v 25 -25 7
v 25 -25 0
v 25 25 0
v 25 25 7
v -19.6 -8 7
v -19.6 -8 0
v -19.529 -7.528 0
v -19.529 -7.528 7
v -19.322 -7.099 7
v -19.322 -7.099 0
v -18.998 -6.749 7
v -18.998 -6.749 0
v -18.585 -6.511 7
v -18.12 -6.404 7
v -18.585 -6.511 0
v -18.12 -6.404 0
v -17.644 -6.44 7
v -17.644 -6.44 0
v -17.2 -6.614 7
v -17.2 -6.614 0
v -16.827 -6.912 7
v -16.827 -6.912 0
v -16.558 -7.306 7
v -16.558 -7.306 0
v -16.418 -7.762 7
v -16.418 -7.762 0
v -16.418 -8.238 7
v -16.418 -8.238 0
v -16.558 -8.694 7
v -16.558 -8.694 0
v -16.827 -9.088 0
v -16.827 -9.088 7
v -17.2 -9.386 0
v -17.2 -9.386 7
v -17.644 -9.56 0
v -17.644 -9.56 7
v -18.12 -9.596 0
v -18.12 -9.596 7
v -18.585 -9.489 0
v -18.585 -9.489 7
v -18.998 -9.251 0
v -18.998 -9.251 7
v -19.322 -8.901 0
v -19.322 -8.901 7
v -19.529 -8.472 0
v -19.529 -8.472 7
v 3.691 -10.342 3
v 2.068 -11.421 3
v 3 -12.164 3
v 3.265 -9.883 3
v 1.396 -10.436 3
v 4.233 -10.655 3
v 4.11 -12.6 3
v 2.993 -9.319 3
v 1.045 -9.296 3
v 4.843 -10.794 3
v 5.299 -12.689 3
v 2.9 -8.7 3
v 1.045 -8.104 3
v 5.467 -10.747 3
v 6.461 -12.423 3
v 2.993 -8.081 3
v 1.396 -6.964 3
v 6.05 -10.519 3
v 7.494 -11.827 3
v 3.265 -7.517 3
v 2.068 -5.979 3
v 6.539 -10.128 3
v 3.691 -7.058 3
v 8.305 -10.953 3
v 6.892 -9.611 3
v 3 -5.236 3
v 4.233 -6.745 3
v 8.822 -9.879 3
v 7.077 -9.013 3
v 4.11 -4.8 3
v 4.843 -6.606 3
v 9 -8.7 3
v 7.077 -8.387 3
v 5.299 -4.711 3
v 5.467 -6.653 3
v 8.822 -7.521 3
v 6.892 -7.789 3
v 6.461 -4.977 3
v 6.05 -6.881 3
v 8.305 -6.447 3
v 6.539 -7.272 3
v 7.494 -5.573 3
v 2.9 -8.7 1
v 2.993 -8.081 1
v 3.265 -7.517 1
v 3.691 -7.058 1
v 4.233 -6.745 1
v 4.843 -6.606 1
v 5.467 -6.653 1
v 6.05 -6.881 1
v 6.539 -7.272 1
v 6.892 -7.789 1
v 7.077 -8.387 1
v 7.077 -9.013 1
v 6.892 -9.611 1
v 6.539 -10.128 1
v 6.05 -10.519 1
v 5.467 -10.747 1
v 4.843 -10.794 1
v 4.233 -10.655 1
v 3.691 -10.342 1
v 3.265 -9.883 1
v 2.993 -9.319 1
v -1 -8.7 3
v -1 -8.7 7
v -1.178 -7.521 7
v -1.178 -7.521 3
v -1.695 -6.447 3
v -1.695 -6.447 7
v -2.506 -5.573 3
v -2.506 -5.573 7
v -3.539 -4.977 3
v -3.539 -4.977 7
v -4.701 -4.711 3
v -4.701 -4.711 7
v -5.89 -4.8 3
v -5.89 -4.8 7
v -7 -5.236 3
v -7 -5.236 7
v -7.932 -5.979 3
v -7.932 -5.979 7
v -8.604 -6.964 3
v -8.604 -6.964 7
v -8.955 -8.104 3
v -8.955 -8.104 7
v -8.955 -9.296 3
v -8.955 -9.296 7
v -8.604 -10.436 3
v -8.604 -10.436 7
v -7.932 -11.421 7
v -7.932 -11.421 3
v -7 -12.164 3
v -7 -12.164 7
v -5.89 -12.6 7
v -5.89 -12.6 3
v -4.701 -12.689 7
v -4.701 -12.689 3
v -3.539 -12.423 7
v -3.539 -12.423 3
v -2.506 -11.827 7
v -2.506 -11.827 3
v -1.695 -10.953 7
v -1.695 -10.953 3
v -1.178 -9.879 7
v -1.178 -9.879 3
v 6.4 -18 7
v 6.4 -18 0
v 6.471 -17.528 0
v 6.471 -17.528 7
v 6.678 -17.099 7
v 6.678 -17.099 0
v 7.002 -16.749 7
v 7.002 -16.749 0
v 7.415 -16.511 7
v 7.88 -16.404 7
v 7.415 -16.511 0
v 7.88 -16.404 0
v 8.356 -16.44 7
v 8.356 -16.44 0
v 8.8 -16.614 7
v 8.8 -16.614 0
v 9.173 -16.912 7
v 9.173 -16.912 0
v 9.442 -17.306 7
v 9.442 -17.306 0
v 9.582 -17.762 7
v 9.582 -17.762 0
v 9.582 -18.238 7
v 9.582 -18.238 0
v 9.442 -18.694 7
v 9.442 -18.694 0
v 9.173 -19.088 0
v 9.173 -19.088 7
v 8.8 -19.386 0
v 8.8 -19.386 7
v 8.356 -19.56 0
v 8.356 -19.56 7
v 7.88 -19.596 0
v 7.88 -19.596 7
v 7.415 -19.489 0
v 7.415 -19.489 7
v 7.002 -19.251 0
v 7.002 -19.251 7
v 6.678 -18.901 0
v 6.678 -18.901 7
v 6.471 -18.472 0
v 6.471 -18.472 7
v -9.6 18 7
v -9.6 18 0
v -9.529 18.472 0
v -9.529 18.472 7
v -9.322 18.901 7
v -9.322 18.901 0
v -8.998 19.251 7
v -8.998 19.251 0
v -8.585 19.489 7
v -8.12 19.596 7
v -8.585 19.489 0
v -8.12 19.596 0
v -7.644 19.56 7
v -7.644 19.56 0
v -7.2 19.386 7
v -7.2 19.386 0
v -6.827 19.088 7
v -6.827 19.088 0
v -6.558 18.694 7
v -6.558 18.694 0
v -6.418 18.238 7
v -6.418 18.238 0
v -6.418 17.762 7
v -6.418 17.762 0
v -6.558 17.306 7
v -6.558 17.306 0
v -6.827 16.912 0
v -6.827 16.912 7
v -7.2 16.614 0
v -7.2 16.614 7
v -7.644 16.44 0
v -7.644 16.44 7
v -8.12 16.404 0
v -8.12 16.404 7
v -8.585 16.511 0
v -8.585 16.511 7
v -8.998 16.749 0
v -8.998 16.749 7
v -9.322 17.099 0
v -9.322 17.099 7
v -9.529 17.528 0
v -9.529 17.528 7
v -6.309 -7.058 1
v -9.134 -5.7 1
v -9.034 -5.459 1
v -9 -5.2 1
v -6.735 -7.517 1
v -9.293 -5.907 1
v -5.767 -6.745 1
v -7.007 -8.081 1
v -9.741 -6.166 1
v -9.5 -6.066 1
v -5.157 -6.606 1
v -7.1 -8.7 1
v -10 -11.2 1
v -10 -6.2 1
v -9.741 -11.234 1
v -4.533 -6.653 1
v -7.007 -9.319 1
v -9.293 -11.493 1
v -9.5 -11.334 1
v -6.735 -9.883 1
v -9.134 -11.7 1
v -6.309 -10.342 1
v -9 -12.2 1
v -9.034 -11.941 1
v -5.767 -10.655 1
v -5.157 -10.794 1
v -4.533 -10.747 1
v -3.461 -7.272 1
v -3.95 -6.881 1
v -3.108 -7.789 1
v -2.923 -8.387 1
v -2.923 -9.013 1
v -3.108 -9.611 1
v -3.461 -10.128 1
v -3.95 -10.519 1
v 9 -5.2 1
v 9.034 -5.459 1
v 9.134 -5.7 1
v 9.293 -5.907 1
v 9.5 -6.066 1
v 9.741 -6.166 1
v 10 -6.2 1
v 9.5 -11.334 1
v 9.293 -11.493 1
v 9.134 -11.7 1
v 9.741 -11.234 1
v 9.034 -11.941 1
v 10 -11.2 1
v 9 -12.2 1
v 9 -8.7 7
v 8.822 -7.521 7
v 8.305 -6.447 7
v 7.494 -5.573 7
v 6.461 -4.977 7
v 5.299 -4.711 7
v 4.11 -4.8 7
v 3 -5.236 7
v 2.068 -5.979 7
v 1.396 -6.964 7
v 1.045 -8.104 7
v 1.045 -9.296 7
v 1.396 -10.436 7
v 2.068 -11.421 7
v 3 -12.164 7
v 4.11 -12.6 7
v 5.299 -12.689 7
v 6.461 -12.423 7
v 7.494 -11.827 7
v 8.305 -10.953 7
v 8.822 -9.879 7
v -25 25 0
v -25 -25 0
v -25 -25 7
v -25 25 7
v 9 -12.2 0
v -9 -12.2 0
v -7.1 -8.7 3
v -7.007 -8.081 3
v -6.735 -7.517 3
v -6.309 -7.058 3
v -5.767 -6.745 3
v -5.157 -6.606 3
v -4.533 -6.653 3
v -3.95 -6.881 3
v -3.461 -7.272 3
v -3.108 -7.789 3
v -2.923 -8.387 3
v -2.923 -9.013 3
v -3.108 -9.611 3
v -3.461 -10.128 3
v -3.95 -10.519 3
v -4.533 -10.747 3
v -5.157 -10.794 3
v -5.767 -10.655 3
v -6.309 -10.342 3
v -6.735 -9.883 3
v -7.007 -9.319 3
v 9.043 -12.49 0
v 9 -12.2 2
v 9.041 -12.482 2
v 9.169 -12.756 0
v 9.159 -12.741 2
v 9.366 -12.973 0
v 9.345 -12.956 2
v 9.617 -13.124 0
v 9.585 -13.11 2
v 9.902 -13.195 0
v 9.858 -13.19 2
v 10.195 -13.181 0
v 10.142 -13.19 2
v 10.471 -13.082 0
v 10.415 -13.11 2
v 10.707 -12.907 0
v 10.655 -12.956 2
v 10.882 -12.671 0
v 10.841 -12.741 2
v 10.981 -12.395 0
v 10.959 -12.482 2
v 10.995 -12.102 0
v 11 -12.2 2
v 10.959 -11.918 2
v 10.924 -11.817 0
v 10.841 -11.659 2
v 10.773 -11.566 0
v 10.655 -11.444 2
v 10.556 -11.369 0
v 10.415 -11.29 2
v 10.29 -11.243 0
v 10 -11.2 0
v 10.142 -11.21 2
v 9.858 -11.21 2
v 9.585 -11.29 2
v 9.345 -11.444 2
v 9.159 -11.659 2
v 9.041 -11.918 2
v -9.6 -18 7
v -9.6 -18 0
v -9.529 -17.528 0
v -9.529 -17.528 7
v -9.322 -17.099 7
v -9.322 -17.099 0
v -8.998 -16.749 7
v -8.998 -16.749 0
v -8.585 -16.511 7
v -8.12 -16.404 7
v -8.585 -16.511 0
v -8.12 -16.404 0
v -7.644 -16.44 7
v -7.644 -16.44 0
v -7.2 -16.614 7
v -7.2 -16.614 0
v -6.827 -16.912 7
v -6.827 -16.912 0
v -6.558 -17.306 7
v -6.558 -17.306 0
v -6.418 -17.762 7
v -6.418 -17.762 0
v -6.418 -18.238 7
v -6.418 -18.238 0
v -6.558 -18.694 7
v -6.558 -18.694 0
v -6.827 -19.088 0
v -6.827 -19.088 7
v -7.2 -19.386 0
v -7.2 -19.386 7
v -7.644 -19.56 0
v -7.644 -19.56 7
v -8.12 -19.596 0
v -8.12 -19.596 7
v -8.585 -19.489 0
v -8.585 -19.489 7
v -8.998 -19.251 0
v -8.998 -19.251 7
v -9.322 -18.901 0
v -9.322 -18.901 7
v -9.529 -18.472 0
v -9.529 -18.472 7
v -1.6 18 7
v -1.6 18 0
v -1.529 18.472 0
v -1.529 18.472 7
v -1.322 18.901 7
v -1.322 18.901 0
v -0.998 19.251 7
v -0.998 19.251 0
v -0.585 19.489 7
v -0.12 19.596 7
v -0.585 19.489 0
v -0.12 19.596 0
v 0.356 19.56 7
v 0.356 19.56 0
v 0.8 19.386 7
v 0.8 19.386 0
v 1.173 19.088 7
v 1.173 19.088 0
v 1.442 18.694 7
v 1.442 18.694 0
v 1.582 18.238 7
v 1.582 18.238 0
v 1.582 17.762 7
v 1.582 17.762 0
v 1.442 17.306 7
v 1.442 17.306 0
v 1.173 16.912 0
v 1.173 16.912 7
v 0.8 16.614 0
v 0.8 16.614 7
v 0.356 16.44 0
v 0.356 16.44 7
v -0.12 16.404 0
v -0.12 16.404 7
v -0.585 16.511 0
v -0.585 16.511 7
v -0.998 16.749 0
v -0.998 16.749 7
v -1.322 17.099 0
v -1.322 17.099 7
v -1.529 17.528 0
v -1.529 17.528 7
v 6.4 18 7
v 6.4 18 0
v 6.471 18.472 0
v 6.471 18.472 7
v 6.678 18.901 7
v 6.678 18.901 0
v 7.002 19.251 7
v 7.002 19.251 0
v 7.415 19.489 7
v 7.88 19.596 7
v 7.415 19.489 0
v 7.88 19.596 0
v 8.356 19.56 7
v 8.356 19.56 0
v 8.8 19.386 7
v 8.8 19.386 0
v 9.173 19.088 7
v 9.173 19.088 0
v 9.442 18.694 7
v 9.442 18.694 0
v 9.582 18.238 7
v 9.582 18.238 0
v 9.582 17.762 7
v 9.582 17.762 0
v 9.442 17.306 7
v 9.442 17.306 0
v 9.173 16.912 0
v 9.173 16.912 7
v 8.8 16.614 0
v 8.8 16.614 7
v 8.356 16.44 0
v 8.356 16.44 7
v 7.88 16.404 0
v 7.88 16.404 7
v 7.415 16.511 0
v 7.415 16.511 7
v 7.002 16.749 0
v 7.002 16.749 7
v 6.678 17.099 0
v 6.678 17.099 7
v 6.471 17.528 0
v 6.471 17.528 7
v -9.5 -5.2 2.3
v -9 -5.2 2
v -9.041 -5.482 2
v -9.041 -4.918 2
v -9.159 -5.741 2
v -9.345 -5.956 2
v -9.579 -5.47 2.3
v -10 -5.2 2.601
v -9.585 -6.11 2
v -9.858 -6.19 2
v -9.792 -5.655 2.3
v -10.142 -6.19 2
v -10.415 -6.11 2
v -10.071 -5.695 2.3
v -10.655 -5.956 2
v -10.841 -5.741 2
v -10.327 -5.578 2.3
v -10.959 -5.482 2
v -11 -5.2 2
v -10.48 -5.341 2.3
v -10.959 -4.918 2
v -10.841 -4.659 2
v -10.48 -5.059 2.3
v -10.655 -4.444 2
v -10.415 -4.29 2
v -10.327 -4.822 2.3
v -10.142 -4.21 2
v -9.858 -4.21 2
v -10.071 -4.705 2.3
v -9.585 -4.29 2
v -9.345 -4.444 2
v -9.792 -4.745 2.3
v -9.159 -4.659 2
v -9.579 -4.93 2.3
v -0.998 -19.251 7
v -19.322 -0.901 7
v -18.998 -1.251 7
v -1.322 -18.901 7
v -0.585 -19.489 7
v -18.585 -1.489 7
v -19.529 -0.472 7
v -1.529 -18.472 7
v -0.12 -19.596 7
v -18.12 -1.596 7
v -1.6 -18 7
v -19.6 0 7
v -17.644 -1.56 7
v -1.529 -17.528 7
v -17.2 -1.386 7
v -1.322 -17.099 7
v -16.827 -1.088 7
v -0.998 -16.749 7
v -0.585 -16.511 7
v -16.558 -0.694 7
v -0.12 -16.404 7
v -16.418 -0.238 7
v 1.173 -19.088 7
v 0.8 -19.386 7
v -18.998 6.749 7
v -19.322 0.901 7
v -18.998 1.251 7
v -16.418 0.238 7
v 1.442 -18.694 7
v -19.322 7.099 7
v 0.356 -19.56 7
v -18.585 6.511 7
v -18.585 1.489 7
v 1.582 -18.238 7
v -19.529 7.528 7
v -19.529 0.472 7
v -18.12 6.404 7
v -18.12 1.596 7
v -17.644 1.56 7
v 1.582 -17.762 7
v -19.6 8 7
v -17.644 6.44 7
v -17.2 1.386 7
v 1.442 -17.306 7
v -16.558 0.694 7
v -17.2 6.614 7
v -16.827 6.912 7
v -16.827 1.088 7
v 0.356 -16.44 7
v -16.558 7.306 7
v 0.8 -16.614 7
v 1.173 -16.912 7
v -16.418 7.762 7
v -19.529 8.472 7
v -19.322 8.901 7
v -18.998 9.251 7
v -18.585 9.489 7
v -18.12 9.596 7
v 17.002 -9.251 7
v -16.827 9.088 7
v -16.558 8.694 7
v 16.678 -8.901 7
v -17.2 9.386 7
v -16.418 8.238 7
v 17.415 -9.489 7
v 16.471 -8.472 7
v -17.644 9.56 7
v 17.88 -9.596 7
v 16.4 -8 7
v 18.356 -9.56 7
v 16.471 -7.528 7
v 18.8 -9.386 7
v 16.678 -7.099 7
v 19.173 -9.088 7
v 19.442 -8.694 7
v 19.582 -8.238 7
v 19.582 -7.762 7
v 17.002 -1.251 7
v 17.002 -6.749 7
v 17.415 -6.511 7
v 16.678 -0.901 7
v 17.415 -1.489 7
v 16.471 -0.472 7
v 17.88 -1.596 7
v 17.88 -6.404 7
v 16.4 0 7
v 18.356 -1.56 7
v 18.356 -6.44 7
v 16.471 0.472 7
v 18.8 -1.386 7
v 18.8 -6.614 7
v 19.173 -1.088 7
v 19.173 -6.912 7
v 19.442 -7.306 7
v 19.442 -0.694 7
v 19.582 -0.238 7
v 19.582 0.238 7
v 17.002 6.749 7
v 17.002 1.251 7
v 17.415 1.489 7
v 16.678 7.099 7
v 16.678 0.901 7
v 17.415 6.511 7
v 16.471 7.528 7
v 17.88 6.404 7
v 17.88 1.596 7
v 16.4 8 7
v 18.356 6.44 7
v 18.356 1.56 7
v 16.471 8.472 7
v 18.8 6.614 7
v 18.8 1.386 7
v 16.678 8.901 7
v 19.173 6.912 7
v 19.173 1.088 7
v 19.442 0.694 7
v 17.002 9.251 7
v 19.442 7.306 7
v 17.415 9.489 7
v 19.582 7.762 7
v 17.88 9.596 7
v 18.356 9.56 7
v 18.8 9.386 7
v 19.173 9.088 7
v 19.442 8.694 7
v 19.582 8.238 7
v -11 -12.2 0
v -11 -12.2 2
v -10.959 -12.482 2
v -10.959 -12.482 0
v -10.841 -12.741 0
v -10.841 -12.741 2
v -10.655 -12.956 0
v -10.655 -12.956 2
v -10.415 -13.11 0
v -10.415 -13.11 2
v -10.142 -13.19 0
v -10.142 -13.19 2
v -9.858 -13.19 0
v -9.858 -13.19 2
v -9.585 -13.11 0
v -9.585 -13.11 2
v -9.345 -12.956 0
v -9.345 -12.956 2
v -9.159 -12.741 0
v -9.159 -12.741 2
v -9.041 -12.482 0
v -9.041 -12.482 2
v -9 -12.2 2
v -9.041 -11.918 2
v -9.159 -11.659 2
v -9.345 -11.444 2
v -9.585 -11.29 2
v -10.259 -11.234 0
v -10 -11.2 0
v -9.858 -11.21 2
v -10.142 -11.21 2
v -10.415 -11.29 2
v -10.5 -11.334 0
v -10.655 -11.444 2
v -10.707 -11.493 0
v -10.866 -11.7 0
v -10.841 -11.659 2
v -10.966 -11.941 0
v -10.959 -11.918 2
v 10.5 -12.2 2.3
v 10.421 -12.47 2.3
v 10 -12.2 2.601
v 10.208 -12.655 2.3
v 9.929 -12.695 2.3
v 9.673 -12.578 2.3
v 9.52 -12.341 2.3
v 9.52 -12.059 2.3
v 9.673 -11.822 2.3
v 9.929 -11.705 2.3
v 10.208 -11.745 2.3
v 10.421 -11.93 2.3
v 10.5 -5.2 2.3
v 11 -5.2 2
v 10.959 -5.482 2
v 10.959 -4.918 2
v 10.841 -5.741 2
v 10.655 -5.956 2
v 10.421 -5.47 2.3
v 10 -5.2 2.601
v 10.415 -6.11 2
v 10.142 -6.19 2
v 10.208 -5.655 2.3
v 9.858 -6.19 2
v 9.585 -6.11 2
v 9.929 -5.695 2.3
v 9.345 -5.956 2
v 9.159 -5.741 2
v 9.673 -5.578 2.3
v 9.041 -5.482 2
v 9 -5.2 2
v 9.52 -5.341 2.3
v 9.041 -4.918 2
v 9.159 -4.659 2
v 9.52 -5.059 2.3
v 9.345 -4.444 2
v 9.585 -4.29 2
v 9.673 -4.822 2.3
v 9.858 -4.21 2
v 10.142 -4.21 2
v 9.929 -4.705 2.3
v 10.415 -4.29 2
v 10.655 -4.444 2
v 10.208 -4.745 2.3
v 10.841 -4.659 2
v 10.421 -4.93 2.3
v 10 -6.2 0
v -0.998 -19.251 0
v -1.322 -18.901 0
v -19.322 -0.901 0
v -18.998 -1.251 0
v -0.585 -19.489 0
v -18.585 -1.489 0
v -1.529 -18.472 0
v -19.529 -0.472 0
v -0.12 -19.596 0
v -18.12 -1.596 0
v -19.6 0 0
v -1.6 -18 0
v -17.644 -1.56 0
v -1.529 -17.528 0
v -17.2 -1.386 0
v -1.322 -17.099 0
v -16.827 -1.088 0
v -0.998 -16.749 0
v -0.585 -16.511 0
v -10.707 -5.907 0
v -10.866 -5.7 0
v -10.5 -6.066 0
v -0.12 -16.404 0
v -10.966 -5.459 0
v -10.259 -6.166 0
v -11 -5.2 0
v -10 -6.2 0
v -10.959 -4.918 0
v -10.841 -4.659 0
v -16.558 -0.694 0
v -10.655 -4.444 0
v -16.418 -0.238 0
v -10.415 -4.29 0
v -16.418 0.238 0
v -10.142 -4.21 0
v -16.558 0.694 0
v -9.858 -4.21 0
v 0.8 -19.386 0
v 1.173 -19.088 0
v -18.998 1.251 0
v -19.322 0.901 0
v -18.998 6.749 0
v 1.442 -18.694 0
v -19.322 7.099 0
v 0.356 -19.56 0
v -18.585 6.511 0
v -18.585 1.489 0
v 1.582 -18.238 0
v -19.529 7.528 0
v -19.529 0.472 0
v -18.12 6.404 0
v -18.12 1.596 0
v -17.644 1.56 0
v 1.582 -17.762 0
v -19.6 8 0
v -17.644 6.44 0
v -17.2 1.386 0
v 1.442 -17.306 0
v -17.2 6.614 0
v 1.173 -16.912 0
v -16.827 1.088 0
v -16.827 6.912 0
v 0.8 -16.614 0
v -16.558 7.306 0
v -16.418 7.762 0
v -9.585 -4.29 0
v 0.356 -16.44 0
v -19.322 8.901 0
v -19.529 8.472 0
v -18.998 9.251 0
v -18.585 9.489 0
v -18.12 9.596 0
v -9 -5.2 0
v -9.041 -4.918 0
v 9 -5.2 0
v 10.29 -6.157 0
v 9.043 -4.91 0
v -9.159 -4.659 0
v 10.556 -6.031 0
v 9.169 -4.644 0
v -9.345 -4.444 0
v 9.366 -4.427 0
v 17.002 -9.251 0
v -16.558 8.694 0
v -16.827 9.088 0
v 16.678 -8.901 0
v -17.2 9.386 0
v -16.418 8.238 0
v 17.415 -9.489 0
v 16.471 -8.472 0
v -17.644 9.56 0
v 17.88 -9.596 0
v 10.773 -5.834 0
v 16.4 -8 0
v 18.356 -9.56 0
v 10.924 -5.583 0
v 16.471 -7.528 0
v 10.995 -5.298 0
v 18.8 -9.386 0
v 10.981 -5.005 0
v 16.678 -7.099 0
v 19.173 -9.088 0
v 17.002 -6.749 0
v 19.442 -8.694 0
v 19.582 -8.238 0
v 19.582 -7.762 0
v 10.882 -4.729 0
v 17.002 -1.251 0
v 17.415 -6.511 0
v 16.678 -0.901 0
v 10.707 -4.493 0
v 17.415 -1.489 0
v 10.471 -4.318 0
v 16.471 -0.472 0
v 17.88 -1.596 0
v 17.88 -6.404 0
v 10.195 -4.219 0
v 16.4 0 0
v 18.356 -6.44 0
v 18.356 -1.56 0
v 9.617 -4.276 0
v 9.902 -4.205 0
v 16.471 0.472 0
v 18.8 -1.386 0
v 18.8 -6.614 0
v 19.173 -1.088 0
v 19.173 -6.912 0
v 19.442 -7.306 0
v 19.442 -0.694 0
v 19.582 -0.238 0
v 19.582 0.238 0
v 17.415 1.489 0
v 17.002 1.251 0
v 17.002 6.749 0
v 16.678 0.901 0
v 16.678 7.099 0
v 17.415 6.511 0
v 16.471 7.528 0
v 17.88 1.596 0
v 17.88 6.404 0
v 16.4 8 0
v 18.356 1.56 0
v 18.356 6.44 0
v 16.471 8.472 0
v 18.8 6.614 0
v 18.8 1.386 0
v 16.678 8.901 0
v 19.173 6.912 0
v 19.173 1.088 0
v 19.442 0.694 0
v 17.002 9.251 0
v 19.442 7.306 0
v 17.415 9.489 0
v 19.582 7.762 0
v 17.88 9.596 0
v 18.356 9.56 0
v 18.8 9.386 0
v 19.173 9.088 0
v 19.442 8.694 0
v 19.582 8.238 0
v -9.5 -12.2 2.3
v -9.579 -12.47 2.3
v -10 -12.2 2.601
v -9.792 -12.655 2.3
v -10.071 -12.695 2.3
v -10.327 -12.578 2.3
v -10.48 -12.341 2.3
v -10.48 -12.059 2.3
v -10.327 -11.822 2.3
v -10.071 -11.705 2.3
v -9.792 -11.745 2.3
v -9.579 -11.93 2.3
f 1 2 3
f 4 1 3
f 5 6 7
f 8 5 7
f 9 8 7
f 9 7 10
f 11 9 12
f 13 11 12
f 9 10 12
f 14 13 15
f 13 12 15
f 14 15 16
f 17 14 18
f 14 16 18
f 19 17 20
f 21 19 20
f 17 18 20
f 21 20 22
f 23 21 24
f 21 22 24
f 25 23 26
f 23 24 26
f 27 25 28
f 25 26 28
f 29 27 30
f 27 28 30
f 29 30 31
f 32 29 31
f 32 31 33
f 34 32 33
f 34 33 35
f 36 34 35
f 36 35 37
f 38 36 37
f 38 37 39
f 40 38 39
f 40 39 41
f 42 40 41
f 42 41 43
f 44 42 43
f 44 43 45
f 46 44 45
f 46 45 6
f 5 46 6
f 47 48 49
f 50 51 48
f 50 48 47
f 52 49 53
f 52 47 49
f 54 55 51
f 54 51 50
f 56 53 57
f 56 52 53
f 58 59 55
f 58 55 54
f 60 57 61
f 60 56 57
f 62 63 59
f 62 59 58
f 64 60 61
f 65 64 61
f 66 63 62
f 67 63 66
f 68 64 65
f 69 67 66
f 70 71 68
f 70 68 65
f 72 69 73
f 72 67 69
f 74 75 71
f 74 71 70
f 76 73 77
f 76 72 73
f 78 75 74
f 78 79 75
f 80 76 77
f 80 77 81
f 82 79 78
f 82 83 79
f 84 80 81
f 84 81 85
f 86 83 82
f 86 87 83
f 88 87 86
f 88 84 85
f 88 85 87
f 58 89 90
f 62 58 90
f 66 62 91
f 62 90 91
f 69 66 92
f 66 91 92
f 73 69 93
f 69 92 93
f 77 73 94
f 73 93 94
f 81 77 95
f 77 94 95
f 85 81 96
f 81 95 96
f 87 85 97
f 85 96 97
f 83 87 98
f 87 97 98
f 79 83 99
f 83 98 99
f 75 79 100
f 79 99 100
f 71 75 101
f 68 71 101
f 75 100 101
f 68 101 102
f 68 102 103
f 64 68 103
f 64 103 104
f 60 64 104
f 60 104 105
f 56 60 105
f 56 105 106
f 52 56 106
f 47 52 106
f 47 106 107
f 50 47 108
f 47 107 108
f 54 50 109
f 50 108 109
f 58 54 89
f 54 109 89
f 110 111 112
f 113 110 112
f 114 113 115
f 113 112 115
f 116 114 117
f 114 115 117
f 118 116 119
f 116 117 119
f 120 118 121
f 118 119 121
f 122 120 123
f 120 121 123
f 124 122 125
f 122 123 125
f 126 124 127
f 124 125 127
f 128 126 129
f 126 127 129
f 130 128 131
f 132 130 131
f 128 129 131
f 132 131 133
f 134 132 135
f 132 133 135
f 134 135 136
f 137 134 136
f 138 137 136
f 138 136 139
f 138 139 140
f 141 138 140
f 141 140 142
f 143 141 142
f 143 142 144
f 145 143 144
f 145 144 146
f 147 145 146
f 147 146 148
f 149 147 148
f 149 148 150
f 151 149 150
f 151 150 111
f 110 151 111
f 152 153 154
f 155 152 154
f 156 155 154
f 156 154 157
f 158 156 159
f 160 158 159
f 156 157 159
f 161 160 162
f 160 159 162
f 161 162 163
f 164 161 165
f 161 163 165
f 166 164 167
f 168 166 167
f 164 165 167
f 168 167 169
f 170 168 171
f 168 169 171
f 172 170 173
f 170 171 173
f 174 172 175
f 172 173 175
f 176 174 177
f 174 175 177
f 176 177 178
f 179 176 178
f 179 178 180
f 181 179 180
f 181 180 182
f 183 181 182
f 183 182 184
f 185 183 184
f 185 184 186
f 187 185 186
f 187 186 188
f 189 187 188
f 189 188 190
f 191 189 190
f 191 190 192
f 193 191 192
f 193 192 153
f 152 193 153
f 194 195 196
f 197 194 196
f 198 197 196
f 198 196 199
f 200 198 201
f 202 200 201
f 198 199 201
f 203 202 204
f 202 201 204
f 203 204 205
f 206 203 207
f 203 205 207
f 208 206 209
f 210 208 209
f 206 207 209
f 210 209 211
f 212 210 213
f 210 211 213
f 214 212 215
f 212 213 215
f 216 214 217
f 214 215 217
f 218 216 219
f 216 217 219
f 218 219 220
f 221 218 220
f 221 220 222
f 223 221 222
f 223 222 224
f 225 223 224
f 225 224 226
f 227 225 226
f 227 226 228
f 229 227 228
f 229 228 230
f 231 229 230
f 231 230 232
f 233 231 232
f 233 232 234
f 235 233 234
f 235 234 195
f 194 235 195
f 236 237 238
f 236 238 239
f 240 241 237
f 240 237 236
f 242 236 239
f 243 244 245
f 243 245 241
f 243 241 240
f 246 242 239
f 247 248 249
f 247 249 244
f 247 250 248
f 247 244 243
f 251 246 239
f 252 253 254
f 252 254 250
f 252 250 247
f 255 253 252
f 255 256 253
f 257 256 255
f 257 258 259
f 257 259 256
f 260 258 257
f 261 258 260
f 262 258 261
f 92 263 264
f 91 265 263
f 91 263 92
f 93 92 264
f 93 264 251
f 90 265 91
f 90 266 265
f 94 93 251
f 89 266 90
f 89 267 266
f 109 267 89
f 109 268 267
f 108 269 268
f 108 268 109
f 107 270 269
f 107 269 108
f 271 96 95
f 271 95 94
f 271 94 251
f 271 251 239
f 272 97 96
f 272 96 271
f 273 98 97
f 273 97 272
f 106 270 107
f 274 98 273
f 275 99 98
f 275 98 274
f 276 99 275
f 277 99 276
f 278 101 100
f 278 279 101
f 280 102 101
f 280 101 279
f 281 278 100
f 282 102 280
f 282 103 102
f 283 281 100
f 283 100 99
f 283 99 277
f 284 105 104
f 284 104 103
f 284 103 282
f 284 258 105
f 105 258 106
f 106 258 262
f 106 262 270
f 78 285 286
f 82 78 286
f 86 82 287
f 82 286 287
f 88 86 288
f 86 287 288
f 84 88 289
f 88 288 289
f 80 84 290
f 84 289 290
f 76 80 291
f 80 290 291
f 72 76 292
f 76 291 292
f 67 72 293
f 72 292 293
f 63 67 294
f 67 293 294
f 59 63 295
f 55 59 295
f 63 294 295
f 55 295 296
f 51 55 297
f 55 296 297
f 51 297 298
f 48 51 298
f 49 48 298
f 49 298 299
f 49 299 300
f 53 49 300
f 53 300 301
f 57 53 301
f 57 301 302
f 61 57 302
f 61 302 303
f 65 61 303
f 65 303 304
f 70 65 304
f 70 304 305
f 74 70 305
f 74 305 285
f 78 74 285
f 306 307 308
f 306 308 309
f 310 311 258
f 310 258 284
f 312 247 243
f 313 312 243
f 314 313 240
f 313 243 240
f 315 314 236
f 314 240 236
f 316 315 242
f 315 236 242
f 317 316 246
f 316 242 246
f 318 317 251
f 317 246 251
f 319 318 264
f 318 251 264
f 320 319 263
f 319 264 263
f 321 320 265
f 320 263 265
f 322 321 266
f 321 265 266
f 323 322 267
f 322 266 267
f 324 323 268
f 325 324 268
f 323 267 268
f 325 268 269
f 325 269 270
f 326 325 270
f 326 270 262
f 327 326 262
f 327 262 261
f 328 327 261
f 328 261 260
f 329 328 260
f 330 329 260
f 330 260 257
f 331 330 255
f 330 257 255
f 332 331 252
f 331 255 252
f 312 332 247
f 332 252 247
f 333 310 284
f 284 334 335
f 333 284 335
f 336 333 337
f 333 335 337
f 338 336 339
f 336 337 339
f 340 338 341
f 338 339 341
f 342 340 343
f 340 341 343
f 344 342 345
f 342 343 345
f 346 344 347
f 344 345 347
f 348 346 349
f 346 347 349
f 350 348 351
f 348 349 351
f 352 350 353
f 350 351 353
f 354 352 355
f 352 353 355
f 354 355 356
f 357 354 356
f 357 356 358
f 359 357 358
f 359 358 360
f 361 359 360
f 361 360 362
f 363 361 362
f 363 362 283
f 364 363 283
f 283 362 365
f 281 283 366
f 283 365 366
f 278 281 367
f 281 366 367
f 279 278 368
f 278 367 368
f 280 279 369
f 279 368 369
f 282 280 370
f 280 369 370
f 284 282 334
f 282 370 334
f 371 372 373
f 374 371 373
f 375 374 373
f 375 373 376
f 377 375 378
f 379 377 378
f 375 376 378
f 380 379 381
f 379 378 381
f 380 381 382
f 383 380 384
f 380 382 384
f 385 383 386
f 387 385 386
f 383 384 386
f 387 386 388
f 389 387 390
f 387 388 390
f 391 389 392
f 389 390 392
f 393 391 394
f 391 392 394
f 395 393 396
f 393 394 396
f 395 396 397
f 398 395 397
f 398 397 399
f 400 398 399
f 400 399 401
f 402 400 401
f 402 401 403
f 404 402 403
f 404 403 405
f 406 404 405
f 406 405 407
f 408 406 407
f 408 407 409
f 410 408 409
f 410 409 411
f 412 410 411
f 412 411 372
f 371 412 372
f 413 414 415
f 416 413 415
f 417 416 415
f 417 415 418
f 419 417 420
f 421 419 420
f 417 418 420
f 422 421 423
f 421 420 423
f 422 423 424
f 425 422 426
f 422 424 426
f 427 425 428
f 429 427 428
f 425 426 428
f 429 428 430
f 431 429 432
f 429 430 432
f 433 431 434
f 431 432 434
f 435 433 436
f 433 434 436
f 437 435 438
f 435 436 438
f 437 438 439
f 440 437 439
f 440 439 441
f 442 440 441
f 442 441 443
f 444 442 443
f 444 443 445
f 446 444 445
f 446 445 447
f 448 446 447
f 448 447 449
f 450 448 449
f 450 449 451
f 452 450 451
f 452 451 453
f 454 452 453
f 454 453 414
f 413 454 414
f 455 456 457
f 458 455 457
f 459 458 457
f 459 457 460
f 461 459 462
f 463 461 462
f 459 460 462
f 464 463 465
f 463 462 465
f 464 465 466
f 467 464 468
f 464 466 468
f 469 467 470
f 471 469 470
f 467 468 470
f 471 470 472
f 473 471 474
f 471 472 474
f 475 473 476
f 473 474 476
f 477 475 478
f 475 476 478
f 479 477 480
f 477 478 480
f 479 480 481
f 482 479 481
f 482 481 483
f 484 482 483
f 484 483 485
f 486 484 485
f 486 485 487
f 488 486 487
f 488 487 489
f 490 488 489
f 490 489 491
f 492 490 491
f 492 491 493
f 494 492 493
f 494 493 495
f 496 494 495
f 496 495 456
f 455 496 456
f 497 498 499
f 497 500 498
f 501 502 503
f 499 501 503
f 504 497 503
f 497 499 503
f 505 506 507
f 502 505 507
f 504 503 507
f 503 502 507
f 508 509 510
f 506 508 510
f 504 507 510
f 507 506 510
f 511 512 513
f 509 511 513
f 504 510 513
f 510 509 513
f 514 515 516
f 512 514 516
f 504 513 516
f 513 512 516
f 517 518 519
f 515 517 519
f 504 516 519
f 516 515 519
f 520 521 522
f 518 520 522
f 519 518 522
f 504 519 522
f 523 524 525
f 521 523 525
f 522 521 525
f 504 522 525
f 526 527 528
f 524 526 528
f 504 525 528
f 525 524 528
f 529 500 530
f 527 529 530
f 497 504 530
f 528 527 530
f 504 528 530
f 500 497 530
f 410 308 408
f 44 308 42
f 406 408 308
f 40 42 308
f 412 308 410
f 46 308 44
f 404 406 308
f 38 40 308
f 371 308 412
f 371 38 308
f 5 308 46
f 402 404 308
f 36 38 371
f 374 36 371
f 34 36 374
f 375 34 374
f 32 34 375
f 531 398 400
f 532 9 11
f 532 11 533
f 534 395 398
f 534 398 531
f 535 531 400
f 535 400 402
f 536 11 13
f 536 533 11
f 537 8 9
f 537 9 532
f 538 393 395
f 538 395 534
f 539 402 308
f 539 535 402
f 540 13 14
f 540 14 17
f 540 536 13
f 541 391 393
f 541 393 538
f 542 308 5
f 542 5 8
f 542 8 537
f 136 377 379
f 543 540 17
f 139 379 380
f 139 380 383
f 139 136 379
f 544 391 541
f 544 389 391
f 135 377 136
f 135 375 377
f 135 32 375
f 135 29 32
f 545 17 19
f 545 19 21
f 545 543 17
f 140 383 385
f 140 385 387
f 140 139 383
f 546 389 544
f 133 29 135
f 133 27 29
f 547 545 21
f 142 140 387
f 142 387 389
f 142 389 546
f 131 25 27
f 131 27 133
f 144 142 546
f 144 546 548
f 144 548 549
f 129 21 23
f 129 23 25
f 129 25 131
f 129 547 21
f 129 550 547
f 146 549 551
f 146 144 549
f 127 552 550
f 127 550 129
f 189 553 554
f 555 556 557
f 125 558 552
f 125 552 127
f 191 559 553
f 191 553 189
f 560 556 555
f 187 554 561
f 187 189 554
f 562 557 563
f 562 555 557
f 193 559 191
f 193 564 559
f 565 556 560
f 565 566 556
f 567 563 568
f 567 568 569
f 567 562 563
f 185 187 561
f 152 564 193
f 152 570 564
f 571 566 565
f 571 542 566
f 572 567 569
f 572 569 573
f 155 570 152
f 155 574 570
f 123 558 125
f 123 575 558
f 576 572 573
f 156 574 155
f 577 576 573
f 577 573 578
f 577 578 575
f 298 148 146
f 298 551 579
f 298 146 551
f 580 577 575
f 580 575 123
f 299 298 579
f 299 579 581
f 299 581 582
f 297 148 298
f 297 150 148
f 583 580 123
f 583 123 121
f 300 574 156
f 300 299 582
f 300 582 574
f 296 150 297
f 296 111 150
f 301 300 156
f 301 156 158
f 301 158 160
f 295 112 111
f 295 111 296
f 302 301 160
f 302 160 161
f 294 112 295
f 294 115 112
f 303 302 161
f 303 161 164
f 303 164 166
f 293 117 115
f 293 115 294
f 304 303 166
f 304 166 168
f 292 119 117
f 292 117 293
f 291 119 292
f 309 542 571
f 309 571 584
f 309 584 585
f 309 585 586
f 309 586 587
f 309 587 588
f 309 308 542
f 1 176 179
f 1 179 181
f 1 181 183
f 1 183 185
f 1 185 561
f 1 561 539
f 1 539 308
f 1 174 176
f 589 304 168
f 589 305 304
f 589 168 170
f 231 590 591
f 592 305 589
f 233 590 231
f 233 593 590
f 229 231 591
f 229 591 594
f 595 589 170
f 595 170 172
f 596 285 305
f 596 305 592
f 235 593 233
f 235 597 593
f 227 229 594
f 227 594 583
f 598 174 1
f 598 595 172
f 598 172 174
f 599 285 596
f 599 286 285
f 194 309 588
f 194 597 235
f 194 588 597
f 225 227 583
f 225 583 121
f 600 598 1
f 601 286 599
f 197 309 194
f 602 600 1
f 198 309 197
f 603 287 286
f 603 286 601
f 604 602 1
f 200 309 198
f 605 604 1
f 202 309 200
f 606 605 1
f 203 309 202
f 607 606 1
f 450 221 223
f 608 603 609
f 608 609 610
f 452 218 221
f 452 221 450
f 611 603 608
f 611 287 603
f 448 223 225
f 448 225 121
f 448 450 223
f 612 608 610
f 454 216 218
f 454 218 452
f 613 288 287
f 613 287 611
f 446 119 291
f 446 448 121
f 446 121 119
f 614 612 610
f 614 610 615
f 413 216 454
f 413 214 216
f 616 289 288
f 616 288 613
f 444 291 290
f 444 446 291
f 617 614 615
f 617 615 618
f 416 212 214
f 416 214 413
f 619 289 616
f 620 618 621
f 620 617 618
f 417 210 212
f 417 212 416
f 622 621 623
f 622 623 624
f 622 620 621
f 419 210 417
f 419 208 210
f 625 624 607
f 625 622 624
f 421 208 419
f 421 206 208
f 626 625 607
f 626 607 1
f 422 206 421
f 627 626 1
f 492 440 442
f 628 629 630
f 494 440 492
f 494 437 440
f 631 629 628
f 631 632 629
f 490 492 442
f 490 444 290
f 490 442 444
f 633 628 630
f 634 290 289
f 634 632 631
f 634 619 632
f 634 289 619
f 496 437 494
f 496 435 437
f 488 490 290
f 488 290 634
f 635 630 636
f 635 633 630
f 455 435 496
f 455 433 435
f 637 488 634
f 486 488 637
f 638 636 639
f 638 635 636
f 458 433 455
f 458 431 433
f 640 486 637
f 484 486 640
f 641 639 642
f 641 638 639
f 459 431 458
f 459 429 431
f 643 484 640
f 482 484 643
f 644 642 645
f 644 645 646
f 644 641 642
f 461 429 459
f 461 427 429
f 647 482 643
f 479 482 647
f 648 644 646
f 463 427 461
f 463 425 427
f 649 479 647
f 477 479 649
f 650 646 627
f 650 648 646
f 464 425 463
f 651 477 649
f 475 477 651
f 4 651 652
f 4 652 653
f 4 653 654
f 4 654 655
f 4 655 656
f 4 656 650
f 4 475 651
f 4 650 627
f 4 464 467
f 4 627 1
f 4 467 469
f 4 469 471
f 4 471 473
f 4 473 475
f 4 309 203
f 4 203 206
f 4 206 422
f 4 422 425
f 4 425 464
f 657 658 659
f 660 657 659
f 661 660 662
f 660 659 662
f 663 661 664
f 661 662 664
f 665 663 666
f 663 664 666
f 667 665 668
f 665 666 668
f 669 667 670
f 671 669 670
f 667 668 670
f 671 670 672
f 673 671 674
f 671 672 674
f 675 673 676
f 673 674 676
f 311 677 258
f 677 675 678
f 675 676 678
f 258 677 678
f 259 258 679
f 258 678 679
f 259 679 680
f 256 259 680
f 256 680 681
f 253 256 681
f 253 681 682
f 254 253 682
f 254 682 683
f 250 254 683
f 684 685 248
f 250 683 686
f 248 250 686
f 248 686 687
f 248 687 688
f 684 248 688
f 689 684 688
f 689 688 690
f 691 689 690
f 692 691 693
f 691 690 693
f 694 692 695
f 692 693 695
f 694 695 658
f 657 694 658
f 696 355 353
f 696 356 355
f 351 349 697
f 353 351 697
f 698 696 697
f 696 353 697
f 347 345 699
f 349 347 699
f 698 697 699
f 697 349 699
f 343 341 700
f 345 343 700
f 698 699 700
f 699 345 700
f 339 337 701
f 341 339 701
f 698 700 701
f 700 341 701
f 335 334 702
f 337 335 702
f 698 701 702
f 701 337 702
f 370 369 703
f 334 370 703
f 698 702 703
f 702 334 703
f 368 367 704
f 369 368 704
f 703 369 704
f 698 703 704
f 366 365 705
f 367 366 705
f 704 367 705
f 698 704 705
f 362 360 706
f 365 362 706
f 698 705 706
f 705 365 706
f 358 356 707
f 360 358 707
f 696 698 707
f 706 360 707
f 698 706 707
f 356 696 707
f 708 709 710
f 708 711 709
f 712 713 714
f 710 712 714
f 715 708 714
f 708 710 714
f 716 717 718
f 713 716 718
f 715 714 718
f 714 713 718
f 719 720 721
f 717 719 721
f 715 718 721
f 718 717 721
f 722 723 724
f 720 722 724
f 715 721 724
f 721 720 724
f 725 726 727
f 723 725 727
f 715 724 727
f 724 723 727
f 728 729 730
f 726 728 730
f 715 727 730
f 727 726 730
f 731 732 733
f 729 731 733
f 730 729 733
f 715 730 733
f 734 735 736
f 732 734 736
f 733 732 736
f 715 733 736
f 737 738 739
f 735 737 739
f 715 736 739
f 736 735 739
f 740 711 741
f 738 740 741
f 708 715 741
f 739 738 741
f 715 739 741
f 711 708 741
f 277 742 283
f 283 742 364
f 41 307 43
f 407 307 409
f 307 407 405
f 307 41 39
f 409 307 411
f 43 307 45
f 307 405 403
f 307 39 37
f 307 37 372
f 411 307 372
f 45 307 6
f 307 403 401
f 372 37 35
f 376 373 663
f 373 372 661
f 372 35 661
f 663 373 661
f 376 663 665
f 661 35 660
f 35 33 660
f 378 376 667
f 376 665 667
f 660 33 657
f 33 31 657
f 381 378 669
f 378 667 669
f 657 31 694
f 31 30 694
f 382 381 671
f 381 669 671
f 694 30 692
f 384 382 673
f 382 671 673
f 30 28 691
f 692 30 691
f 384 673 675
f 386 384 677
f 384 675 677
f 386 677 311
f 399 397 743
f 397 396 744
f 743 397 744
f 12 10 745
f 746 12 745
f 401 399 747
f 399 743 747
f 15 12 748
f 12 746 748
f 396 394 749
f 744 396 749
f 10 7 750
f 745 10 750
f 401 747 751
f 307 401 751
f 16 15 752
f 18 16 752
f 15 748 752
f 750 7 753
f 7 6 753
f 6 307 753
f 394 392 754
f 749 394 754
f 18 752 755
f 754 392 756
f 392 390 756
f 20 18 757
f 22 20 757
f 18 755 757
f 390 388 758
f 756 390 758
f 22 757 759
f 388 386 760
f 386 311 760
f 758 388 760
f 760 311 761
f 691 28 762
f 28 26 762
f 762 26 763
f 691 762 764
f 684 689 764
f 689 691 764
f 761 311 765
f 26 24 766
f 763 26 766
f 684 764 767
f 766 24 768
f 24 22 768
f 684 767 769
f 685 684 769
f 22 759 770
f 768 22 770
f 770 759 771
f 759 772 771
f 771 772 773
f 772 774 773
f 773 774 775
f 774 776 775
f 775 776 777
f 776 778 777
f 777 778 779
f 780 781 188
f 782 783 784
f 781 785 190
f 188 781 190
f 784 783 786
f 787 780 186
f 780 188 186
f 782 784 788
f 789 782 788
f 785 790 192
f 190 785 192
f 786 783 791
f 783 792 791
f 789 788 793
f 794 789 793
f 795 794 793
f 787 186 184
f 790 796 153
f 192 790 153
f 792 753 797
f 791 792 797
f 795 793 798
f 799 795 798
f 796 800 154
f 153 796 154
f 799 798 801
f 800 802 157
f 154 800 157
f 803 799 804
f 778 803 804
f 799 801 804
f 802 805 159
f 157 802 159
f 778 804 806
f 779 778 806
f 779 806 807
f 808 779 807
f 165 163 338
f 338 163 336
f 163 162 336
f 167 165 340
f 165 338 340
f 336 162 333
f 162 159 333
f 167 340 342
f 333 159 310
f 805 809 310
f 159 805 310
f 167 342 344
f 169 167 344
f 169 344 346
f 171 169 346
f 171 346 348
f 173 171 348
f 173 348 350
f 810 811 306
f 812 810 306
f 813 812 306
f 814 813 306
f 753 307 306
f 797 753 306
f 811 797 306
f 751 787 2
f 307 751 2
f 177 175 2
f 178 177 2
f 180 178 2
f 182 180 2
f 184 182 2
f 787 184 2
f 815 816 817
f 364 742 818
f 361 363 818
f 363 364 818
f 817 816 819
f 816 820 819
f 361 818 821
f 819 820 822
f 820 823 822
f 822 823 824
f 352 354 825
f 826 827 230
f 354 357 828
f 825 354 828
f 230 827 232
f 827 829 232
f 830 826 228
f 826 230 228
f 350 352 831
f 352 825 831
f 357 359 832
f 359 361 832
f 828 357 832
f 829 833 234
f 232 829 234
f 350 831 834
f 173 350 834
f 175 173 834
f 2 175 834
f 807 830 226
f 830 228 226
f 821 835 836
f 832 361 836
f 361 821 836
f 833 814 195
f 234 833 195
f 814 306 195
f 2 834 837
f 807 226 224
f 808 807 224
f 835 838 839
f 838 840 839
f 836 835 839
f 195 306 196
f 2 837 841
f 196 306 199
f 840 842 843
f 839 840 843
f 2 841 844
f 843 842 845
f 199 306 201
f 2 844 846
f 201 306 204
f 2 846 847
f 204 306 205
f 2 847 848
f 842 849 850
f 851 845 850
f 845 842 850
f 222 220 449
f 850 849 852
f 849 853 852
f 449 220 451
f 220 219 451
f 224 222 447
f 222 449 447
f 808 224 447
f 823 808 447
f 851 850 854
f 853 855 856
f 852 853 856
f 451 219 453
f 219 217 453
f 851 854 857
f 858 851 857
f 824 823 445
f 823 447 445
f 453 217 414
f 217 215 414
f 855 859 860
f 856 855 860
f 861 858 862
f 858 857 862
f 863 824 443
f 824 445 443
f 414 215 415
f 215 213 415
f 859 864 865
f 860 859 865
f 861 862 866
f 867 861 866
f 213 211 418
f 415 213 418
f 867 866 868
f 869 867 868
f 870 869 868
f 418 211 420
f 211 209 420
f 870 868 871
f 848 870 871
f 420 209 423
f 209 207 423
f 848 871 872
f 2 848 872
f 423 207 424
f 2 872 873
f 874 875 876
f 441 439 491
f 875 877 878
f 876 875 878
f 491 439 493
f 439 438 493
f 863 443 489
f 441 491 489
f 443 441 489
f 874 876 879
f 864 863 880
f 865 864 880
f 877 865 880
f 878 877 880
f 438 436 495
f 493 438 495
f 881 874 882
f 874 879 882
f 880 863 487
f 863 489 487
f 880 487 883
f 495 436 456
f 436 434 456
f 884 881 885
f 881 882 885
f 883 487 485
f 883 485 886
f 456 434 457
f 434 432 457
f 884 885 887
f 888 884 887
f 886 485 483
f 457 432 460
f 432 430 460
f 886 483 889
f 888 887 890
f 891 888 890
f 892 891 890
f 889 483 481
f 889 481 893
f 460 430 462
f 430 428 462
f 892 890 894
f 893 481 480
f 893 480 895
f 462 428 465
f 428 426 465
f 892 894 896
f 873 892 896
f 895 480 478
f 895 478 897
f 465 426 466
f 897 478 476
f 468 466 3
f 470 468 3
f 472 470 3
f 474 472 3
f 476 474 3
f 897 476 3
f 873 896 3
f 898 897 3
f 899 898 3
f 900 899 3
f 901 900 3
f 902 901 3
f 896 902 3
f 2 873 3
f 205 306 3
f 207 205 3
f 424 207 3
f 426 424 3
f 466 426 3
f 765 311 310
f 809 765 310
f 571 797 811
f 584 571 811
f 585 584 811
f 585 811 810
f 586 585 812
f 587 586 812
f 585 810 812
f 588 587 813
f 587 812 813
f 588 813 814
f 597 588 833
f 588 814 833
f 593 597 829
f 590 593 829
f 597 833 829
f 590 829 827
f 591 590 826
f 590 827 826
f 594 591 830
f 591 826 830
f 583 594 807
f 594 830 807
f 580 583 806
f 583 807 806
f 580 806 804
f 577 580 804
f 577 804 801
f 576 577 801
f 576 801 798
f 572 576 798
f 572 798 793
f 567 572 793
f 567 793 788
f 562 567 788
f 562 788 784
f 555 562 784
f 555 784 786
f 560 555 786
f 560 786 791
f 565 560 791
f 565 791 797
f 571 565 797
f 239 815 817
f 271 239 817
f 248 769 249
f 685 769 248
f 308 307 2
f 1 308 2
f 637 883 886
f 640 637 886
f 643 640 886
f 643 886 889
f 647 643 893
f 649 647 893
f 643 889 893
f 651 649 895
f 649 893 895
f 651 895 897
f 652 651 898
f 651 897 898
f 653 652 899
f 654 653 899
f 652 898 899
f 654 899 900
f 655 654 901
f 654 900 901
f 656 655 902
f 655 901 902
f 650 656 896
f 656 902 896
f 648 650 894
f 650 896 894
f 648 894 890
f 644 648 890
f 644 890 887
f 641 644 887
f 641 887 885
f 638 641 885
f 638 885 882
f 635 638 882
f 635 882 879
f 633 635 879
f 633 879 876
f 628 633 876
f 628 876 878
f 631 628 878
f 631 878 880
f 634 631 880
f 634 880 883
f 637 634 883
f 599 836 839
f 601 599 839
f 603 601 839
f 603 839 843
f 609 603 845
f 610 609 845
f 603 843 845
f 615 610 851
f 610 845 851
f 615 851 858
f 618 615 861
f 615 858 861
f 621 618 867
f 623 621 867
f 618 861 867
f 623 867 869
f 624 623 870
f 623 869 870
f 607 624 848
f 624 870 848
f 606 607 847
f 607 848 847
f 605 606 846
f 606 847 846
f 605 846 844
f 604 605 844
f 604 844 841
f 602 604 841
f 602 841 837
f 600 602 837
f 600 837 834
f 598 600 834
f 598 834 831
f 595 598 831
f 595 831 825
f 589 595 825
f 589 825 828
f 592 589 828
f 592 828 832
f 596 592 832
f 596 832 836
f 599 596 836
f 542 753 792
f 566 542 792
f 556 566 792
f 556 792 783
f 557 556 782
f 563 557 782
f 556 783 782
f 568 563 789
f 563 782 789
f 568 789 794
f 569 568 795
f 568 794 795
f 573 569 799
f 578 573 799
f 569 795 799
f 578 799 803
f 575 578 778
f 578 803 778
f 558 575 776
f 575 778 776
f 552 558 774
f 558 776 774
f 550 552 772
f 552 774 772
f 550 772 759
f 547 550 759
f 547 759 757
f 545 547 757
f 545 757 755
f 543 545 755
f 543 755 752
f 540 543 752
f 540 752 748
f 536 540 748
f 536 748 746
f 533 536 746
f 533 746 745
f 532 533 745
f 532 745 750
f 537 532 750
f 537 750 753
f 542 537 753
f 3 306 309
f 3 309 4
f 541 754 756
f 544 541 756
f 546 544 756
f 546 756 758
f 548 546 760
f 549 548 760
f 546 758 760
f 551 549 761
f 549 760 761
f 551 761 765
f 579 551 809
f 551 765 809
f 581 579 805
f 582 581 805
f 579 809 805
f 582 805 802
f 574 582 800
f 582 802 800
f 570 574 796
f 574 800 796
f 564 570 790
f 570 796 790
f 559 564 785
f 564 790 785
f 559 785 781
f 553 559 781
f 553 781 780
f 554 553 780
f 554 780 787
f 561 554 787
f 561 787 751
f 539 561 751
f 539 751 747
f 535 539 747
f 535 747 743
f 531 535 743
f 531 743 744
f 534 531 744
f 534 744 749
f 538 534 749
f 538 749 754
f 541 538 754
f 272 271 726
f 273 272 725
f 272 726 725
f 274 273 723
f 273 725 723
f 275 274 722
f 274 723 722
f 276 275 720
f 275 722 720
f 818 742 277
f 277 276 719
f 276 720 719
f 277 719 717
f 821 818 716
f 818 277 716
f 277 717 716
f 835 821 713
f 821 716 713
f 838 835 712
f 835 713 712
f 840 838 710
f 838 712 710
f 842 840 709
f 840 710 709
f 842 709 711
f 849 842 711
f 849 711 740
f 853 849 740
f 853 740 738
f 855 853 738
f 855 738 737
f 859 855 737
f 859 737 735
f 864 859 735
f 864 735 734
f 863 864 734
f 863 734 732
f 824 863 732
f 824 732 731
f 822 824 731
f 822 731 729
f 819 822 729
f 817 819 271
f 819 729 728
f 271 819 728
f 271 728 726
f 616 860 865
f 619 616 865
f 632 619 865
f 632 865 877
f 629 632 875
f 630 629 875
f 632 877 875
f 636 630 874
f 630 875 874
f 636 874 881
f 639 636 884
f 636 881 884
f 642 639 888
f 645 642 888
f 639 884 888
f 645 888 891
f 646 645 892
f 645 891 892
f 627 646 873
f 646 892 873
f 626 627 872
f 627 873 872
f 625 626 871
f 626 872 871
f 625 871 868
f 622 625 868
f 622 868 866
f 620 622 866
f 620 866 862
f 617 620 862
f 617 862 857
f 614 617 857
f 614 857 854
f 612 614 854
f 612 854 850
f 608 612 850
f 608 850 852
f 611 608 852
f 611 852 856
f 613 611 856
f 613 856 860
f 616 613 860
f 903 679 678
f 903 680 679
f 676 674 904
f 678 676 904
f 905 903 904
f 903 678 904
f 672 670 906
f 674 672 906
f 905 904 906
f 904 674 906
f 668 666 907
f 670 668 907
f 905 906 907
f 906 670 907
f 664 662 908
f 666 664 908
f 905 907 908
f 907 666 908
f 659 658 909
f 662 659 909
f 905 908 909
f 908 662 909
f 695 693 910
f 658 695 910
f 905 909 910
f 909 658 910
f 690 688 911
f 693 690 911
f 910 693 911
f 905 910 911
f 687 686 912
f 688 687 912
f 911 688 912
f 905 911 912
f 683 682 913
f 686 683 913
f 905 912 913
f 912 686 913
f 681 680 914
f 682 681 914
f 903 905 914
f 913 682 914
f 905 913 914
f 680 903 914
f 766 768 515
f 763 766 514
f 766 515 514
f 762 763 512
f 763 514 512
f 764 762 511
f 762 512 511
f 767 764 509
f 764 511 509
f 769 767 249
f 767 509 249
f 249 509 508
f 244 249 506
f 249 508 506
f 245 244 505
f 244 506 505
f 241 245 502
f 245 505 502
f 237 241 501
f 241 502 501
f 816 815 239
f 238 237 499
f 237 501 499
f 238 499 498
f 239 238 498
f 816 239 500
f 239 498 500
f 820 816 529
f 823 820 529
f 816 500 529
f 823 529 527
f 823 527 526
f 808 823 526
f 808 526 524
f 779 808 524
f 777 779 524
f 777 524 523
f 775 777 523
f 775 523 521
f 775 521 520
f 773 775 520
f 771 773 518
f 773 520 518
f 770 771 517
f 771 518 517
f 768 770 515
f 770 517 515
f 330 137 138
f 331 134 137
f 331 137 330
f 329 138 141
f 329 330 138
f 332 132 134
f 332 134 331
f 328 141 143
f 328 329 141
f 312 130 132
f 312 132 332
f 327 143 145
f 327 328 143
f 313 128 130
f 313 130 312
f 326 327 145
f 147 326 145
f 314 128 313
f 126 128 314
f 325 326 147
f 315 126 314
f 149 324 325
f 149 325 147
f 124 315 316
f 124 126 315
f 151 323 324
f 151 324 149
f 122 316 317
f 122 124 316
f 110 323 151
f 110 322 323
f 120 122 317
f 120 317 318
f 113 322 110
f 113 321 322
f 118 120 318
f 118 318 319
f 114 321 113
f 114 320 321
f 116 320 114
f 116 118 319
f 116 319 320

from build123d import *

# Parameters (mm, degrees)
F0_W           = 50
F0_H           = 50
F1_DEPTH       = 7
F3_D           = 3.2
F4_D           = 4.2
F4_CBORE_D     = 8
F4_CBORE_DEPTH = 4
F5_W           = 20
F5_H           = 7
F5_R           = 2.1
F6_DEPTH       = 1
F7_D           = 2
F7_DEPTH       = 1
F7_START       = 1
F7_TIP         = 0.600860619


with BuildPart() as f1:
    # F0 (on Top) → F1 (new body)
    with BuildSketch(Plane.XY):
        Rectangle(F0_W, F0_H)
    extrude(amount=F1_DEPTH)

    # F3 (through all)
    with Locations(Plane.XY.offset(7)):
        with Locations((-18, 8), (-18, 0), (-18, -8), (-8, -18), (0, -18), (8, -18), (18, -8), (18, 0), (18, 8), (-8, 18), (0, 18), (8, 18)):
            Hole(F3_D / 2)

    # F4 (through all)
    with Locations(Plane.XY.offset(7)):
        with Locations((-5, -8.7), (5, -8.7)):
            CounterBoreHole(F4_D / 2, F4_CBORE_D / 2, F4_CBORE_DEPTH)

    # F5 (on face) → F6 (cut)
    with BuildSketch(Plane(origin=(0, 0, 0), x_dir=(1, 0, 0), z_dir=(0, 0, -1))):
        with Locations((0, 8.7)):
            Rectangle(F5_W, F5_H)
        with Locations((-5, 8.7)):
            Circle(F5_R, mode=Mode.SUBTRACT)
        with Locations((5, 8.7)):
            Circle(F5_R, mode=Mode.SUBTRACT)
    extrude(amount=-F6_DEPTH, mode=Mode.SUBTRACT)

    # F7
    # its depths count from where the whole tool has entered the part; down to there all is cleared
    with Locations(Plane(origin=(0, 0, 0), x_dir=(1, 0, 0), z_dir=(0, 0, -1)).offset(-F7_START)):
        with Locations((-10, 5.2), (-10, 12.2), (10, 12.2), (10, 5.2)):
            Hole(F7_D / 2, depth=F7_DEPTH)
            with Locations((0, 0, -(F7_DEPTH + F7_TIP / 2))):  # 118° drill point
                Cone(0, F7_D / 2, F7_TIP, mode=Mode.SUBTRACT)


solid = f1.part
